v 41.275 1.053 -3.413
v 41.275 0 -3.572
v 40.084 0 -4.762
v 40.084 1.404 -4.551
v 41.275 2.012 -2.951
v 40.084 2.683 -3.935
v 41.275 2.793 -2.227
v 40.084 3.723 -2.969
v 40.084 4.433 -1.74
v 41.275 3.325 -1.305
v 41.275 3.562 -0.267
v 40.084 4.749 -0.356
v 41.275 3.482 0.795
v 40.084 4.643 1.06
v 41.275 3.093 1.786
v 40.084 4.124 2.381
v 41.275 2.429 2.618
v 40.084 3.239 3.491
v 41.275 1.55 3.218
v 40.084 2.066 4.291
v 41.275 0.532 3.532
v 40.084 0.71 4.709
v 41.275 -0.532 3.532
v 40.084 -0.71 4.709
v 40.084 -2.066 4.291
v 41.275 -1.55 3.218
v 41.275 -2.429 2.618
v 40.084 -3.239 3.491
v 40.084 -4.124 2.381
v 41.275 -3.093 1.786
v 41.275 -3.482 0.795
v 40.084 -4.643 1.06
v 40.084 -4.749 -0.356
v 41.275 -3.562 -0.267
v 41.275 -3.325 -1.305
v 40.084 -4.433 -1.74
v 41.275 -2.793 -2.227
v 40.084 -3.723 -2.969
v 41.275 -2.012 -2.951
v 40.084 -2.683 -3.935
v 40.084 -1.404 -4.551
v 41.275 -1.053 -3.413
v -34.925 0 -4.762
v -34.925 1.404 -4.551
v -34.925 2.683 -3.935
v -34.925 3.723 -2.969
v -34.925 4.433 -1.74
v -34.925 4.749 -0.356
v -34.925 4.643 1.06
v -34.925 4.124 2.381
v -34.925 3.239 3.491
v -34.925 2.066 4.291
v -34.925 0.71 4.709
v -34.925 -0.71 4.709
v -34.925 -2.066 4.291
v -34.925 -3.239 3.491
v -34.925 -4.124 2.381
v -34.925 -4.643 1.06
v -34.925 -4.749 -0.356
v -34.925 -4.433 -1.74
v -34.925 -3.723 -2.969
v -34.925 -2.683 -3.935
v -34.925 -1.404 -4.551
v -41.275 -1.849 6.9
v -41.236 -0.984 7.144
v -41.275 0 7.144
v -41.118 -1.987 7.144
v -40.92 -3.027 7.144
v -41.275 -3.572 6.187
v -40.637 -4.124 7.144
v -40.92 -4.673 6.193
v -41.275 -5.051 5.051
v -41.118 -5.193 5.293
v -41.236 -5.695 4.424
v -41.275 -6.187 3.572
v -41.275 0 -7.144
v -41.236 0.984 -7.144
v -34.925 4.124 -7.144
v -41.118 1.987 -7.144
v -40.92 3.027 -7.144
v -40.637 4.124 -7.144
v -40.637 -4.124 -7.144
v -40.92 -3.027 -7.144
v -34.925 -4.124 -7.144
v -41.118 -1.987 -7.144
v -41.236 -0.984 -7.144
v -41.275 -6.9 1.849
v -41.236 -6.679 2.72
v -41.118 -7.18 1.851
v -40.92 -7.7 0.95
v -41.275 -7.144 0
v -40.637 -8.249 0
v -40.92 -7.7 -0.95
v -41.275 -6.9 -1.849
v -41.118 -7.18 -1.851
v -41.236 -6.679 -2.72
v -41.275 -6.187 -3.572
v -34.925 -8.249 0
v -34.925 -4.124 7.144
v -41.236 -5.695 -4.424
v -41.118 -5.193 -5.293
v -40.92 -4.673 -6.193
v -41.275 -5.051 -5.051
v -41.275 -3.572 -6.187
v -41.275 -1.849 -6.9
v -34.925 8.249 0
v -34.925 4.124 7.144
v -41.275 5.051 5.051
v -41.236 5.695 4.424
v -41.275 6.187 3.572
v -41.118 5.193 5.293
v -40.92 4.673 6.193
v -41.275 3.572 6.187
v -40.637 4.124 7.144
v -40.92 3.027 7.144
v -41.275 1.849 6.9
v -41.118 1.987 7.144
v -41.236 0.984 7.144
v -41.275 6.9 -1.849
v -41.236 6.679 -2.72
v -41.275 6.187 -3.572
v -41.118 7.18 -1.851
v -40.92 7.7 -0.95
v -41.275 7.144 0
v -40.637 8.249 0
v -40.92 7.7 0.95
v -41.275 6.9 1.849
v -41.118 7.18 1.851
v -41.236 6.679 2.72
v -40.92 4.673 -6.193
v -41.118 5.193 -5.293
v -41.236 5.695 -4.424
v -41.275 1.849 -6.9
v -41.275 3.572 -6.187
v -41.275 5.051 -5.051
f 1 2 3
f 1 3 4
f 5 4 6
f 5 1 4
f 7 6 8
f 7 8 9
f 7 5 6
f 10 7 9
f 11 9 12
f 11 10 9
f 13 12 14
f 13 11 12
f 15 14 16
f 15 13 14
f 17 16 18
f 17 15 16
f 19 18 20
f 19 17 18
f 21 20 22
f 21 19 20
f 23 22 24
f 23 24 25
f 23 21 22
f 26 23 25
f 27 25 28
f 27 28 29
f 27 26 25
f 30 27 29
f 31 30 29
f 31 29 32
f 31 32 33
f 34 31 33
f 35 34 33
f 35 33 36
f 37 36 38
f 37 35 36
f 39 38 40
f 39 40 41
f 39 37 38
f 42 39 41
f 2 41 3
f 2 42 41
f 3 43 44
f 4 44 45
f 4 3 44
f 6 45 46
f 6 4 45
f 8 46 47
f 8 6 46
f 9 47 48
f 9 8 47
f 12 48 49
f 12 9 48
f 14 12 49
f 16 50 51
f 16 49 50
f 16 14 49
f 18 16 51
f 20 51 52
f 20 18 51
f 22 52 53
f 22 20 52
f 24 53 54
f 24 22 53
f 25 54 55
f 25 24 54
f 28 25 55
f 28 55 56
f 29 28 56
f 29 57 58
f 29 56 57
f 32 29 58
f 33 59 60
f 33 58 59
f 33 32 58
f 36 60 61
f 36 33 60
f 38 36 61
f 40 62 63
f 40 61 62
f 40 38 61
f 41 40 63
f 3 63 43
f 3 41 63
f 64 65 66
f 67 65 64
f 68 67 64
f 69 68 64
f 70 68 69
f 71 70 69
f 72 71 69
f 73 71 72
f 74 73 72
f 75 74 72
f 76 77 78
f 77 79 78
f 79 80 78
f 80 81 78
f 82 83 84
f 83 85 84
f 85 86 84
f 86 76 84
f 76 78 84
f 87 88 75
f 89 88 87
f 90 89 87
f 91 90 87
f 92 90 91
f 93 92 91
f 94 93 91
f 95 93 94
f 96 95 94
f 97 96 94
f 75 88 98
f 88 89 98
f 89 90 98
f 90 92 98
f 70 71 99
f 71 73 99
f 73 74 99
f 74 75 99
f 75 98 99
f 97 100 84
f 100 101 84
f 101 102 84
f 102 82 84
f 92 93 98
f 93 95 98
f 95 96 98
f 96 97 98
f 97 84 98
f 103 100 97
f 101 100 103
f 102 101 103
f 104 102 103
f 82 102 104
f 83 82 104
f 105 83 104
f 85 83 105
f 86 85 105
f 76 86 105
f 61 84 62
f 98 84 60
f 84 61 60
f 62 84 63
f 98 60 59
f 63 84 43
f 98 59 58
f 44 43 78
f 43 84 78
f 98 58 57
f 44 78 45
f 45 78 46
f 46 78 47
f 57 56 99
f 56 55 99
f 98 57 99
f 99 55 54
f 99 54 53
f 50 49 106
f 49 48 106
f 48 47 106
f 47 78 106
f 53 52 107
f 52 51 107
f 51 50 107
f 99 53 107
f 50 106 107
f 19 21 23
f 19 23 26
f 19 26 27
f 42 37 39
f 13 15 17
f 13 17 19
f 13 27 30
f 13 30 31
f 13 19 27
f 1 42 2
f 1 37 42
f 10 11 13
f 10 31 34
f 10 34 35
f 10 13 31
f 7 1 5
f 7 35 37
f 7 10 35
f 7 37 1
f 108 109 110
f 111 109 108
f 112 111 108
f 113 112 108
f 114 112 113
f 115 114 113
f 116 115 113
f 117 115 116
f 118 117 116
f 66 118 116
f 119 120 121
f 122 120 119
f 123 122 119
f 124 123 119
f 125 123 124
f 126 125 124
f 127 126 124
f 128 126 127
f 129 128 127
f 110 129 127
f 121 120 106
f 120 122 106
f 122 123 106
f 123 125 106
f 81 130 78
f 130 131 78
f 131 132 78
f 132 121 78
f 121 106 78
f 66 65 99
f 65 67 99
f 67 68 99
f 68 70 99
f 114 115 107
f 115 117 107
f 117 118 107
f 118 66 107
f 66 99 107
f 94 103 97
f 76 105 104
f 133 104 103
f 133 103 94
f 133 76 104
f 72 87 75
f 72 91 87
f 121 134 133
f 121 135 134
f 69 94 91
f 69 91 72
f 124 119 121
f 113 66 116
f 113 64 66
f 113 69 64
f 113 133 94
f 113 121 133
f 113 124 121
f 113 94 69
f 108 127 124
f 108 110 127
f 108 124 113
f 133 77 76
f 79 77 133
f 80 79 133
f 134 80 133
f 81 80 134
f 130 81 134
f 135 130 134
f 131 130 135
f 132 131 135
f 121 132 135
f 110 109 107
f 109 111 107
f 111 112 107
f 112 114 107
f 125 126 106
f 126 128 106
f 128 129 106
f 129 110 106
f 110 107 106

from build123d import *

# Parameters (mm, degrees)
SKETCH5_R           = 4.7625
BOSS_EXTRUDE3_DEPTH = 76.2
CHAMFER1_SIZE       = 1.190625
BOSS_EXTRUDE4_DEPTH = 6.35
SKETCH8_OUTSIDE_W   = 322.79
SKETCH8_OUTSIDE_H   = 325
SKETCH8_OUTSIDE_R   = 7.14375
CUT_EXTRUDE3_DEPTH  = 83.55
CUT_EXTRUDE3_TAPER  = 60


with BuildPart() as part:
    # Sketch5 → Boss-Extrude3 (new body)
    with BuildSketch(Plane(origin=(41.275, 0, 0), x_dir=(0, 0, -1), z_dir=(1, 0, 0))):
        Circle(SKETCH5_R)
    extrude(amount=-BOSS_EXTRUDE3_DEPTH)

    # Chamfer1
    chamfer1_edges = [part.edges().sort_by_distance(p)[0] for p in [
        (41.275, 0, 4.7625),
    ]]
    chamfer(chamfer1_edges, length=CHAMFER1_SIZE)

    # Sketch11 → Revolve1 (revolve)
    with BuildSketch(Plane.XY):
        Polygon((-34.925, 4.7625), (-34.925, 0), (20.6375, 0), (15.875, 4.7625), align=None)
    revolve(axis=Axis((-34.925, 0, 0), (1, 0, 0)))

    # Sketch6 → Boss-Extrude4 (add)
    with BuildSketch(Plane.ZY.offset(34.925)):
        Polygon((7.14375, 4.124445986), (0, 8.248891971), (-7.14375, 4.124445986), (-7.14375, -4.124445986), (0, -8.248891971), (7.14375, -4.124445986), align=None)
    extrude(amount=BOSS_EXTRUDE4_DEPTH)

    # Sketch8 outside → Cut-Extrude3 (cut, through all)
    with BuildSketch(Plane.ZY.offset(41.275)):
        Rectangle(SKETCH8_OUTSIDE_W, SKETCH8_OUTSIDE_H)
        Circle(SKETCH8_OUTSIDE_R, mode=Mode.SUBTRACT)
    extrude(amount=-CUT_EXTRUDE3_DEPTH, taper=CUT_EXTRUDE3_TAPER, mode=Mode.SUBTRACT)


solid = part.part
